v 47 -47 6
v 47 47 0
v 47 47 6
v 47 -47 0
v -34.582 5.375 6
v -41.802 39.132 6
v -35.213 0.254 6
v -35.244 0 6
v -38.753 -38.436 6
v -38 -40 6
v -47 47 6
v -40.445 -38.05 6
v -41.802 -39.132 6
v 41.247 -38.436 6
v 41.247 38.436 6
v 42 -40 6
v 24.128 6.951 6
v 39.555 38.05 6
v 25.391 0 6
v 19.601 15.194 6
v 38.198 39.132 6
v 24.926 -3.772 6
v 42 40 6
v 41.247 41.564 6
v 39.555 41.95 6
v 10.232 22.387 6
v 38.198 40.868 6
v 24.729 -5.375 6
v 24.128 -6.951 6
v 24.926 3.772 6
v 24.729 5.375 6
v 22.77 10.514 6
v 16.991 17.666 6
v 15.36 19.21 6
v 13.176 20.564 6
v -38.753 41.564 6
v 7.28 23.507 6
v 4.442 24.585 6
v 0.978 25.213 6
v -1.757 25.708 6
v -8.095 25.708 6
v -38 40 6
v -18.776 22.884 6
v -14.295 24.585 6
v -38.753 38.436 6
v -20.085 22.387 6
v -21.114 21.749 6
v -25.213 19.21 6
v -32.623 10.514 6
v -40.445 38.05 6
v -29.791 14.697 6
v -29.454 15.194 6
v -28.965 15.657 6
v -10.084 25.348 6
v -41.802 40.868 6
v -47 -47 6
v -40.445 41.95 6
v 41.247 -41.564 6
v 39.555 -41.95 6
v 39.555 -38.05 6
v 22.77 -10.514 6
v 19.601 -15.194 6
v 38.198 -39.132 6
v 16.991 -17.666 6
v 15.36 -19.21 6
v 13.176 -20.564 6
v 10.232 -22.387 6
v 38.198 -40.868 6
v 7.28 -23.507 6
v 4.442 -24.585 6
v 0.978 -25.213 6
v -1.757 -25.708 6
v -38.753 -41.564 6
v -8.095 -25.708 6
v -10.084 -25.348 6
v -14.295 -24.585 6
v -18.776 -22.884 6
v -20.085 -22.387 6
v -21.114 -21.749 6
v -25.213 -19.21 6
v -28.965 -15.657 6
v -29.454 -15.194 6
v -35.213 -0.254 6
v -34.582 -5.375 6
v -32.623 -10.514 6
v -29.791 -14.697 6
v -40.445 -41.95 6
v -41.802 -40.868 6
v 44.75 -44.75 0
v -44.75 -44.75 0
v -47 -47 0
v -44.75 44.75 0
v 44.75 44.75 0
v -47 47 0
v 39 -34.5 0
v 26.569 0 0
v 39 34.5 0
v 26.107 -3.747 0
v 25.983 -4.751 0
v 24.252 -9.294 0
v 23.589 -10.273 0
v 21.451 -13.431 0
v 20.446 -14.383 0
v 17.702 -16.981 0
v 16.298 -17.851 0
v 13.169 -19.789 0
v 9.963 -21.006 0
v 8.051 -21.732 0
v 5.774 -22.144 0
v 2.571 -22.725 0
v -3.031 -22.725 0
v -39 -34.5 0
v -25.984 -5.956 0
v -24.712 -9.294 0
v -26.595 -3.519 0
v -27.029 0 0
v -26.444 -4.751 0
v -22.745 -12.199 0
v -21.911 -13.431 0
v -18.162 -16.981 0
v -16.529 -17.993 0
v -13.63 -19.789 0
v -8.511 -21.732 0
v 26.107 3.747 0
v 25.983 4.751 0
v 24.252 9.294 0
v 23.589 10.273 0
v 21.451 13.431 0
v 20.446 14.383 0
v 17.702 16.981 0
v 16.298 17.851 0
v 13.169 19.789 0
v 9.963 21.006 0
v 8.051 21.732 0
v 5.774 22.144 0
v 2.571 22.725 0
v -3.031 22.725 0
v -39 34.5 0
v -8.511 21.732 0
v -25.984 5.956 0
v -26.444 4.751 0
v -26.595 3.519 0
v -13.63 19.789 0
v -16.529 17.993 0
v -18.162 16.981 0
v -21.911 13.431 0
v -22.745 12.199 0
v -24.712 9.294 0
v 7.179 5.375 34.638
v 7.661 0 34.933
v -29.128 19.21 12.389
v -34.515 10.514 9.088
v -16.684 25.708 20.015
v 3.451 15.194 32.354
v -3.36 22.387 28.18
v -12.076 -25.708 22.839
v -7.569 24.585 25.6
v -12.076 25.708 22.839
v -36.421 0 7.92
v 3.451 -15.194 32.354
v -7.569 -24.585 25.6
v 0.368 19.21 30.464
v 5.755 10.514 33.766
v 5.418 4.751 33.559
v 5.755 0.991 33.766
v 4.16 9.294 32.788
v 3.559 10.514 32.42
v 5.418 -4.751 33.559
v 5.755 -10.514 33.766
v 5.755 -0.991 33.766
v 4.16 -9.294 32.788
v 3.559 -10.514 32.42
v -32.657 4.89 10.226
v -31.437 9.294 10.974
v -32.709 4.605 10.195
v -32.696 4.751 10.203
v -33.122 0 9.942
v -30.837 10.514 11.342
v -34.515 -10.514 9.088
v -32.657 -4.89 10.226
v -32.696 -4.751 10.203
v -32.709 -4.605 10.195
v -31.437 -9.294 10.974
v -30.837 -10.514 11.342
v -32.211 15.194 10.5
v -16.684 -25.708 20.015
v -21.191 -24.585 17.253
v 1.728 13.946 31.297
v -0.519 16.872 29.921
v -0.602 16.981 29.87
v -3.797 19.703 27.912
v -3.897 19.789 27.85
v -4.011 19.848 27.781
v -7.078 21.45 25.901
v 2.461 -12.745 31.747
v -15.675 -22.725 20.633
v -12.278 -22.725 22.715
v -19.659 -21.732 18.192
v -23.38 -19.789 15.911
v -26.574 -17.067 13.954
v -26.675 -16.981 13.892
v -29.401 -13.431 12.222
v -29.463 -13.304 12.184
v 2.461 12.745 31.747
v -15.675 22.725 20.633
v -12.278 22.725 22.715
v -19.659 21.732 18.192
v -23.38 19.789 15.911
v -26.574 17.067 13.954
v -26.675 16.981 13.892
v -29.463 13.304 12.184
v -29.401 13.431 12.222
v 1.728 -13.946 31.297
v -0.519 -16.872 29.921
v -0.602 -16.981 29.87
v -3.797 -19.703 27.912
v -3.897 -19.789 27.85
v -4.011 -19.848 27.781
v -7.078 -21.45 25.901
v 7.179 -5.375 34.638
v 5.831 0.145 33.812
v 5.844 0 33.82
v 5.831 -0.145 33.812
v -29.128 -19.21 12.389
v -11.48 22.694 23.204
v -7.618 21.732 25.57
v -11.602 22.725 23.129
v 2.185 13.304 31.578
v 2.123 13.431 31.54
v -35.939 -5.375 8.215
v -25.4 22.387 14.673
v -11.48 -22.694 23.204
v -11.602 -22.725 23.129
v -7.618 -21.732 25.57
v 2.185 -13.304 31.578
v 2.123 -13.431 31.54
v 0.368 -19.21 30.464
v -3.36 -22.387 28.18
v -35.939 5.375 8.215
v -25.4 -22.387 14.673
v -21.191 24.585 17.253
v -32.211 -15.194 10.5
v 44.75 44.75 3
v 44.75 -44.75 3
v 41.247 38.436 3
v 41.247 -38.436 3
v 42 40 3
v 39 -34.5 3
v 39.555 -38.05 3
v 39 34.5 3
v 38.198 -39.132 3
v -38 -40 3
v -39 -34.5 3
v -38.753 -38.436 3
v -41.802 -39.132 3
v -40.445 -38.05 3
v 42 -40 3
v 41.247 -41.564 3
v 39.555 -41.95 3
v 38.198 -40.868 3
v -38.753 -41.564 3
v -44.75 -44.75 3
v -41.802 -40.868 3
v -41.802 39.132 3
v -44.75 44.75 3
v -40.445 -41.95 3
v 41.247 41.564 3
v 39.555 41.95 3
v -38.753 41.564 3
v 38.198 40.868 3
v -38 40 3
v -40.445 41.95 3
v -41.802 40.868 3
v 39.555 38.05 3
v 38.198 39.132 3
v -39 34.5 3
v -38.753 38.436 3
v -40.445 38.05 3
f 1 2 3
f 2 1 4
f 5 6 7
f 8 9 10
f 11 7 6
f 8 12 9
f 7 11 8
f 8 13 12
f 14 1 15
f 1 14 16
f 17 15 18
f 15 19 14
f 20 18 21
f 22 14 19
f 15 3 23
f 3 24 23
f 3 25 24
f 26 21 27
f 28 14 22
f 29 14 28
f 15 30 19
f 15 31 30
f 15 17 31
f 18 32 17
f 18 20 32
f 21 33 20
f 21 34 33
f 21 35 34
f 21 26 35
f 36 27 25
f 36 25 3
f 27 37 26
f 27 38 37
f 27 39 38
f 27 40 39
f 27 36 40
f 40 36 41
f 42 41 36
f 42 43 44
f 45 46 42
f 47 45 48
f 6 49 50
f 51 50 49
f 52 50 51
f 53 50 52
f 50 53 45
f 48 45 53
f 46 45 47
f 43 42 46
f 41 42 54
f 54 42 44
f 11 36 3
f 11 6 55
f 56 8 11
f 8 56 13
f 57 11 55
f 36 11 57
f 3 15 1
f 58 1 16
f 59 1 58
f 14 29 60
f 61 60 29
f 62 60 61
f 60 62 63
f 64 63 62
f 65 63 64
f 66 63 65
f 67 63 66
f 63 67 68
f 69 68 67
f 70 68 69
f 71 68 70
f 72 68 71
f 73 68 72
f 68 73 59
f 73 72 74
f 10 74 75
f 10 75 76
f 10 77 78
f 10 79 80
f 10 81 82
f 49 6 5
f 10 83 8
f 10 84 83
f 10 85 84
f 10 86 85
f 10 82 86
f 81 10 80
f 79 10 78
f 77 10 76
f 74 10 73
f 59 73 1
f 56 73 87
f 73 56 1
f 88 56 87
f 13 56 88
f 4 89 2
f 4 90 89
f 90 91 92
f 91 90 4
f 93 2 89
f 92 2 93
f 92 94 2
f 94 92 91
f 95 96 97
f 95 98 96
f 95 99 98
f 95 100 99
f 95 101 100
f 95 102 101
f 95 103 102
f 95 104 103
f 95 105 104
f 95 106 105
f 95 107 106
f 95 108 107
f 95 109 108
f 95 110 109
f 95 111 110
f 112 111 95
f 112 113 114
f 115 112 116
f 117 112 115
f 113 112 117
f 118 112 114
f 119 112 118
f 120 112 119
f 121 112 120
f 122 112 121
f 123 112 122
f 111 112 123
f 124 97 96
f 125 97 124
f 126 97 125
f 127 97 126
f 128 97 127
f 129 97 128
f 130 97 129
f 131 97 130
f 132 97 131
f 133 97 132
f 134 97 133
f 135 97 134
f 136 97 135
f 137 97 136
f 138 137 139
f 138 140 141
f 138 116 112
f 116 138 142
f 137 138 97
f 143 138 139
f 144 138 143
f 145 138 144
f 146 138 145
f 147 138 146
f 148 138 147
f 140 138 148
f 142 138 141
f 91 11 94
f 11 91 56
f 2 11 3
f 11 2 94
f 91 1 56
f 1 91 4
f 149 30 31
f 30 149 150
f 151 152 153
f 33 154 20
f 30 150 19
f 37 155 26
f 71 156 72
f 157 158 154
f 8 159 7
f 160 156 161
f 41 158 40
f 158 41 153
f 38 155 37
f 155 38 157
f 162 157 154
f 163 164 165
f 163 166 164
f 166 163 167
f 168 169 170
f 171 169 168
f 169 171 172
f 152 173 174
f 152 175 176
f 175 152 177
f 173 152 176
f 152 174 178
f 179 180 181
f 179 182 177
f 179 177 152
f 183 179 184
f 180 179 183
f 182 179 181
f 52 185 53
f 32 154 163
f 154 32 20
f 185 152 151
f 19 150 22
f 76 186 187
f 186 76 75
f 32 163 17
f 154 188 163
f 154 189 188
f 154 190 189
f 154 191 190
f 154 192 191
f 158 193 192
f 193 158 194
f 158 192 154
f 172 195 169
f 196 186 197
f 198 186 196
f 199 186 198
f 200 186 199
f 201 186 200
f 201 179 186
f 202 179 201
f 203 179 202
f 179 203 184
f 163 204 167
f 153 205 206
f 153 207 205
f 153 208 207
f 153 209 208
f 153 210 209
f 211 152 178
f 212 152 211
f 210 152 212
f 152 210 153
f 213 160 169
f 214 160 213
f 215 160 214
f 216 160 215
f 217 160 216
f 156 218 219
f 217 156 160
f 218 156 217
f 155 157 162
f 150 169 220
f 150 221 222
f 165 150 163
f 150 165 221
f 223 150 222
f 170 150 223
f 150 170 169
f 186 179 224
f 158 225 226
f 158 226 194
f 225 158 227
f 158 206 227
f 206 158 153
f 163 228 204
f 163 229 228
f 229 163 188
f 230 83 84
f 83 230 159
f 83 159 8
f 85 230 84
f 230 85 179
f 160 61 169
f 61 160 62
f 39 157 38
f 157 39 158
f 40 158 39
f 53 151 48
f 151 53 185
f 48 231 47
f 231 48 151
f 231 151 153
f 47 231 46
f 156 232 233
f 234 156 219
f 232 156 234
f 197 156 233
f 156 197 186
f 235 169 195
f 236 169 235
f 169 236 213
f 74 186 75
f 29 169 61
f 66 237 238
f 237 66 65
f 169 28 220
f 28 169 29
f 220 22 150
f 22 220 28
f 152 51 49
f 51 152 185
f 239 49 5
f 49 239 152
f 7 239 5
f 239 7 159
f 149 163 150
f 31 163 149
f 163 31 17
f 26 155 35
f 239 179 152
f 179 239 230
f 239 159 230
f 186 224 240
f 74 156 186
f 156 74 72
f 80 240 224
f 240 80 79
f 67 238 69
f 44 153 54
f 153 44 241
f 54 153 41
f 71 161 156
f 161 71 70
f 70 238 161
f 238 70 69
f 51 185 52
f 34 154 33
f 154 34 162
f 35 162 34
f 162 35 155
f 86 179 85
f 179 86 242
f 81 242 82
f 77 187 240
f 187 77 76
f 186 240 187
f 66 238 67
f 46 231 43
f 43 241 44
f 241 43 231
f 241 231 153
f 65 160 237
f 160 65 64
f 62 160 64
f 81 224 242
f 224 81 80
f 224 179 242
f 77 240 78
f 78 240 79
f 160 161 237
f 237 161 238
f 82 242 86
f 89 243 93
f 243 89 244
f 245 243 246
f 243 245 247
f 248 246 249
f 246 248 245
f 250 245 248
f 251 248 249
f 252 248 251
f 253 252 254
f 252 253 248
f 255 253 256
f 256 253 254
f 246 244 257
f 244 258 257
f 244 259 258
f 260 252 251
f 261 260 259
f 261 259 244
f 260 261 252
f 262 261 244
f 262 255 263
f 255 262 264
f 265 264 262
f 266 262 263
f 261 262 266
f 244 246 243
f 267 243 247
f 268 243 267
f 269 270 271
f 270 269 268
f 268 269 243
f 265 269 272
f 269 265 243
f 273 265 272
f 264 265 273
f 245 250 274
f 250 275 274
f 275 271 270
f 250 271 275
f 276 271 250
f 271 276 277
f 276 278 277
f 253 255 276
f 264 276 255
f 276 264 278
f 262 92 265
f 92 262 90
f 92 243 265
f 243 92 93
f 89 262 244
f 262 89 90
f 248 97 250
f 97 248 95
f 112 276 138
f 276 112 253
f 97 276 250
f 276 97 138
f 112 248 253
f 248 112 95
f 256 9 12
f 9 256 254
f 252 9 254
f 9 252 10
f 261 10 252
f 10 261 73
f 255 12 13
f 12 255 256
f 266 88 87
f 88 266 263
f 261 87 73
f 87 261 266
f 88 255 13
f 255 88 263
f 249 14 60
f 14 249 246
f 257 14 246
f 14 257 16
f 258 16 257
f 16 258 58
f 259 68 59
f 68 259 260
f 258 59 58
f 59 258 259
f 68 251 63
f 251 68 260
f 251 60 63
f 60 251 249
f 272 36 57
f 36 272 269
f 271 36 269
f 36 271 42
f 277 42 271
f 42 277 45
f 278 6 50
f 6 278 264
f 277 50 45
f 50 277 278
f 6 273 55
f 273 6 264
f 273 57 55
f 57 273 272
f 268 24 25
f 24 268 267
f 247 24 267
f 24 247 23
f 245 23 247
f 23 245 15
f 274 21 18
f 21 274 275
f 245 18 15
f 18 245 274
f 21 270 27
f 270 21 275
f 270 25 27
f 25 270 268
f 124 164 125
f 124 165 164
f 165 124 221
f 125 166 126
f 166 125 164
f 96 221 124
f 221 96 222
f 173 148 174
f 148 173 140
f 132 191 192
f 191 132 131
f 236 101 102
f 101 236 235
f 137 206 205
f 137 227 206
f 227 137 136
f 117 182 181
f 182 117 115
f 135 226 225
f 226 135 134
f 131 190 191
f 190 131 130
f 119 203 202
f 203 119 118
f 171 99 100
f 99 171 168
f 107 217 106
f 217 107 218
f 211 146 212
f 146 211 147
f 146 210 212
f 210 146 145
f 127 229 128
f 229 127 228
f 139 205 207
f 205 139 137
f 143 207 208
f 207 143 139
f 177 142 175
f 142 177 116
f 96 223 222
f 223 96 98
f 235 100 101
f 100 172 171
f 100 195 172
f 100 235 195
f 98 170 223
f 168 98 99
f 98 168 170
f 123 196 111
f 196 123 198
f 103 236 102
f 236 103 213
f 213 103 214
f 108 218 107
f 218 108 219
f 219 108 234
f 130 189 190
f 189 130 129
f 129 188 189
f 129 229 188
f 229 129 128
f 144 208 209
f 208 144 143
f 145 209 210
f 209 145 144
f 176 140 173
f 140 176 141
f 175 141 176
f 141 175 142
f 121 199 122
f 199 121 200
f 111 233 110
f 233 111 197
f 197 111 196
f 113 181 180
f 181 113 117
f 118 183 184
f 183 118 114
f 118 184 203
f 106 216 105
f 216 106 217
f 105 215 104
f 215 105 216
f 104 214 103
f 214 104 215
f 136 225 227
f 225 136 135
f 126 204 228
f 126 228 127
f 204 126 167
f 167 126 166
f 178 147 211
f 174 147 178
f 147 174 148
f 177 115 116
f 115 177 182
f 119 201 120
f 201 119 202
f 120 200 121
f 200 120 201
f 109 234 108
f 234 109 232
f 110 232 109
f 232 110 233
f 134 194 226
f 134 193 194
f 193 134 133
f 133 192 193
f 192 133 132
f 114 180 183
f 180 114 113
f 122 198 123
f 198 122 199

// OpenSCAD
// file: ../../library.scad
module tubo(
	h/*Altura*/,
	w/*Pared*/,
	d/*Diametro*/
){
  difference()
  {
    cylinder(r=(d/2), h);
    translate([0,0,-0.1])
    cylinder(r=(d/2)-(2*w), h+0.2);
  }
}

module huyoMasPared(
	d/*Diametro del hoyo*/,
	w/*Pared*/,
	h/*Altura*/,
){
  difference()
  {
    cylinder(r=((d+(2*w))/2), h);
    translate([0,0,-0.1])
    cylinder(r=(d/2), h+0.2);
  }
}

module cuboMasPared(
    w1, //Largo
    w2, //Ancho
    p1, //Pared
    p2, //Pared
    h   //Alto
)
{    
    difference()
    {
        translate([-(w1+(p1*2))/2,-(w2+(p2*2))/2,0])
        cube([(w1+(p1*2)),(w2+(p2*2)),h]);
        
        translate([-w1/2,-w2/2,-0.2])
        cube([w1,w2,h*2]);
        
    }
    
    
}

soporteW = 0.7;

module soporteCylinder()
{
  difference()
  {
	cylinder(r=radio,altura);

	translate([0,0,-0.1])
	cylinder(r=radio-soporteW,altura+0.2);
  }

  if(true){
  difference()
  {
	cylinder(r=radio+0.75,1);

	translate([0,0,-0.1])
	cylinder(r=radio-0.75,1.25);
  }}

}

module soporteOval()
{
  difference()
  {
	oval(w=ancho, h=largo, height=alto, center = false);

	translate([0,0,-0.1])
	oval(ancho-soporteW, largo, alto+0.2);
  }

  difference()
  {
	oval(w=ancho+1, h=largo+1, height=1, center = false);

	translate([0,0,-0.1])
	oval(w=ancho-1, h=largo-1, height=1.25, center = false);
  }

}


module oval(w,h, height, center = false)
{
  scale([1, h/w, 1]) cylinder(h=height, r=w, center=center);
}
// file: Frame.scad
include <Diffracter.scad>

frameW = 64;
frameH = 53.5;
frameD = 2.5;

slideW = frameW - 9;
slideH = frameH - 10;
slideD = 0.8;

winW = slideW;
winH = slideH - 10;

diffW = winW+5;
diffH = winH+13;


//Activate this to display
if(false)
{
  Frame();
}

module Frame()
{
difference()
{

  //translate([-frameW/2,-frameH/2,0])
  //cube([frameW,frameH,frameD]);

  areaSello();

  translate([-winW/2,-winH/2,-0.5])
  cube([winW,winH,frameD*2]);

  translate([-diffW/2,-diffH/2,frameD-0.8])
  cube([diffW,diffH,2]);

}
}


module areaSello()
{
  //cylinder(r=(raspSellR/2)-1,frameD);

  translate([-(frameW)/2,-(frameH)/2,0])
  cube([frameW,frameH,frameD]);
}
// file: Diffracter.scad
//include <Tapa.scad>
include <../../library.scad>


bigW = 88;
ori = bigW/2;
raspSellR = 59;
tuboH = 140;
H = 18.5;
selloH = 7;
tornR = 2;

huecoPared = 12;
huecoH = 22;
selloHembraRadio=40;

//Activate this to display
if(0)
{
translate([0,0,bigW/2])
rotate([0,90,0])
diffracter();


//soporteCylinder(radio=25.2,altura=3.8);

}


module diffracter(){	

difference(){

//Bloque
translate([-bigW/2,-bigW/2,0])
cube([bigW,bigW,H]);


translate([
						-(bigW-huecoPared)/2,
						-(bigW-huecoPared)/2,
						(huecoH/2)
					])
		cube([
					bigW-huecoPared,
					bigW-huecoPared,
					H-huecoH]
				);


//Diffractador
translate([-37.25,-40,-0.1])
cube([74.5,80,5.6]);

//Macro
translate([0,0,5.4])
cylinder(r=(74.5/2),8.2);

//Sello de raspberry
//translate([0,0,-0.1])
//cylinder(r=(raspSellR/2)+1,2);

//Tubo
//translate([0,0,-0.1])
//cylinder(r=(52/2),200);

//Tornillos abajo
translate([-ori+4,-ori+4,-0.1])
cylinder(r=tornR,20);
translate([ori-4,-ori+4,-0.1])
cylinder(r=tornR,20);
translate([-ori+4,ori-4,-0.1])
cylinder(r=tornR,20);
translate([ori-4,ori-4,-0.1])
cylinder(r=tornR,20);

//Hueco
cylinder(r=35.5,H+1);

//Tornillos caja
translate([0,0,(tuboH/2)-7])
rotate([0,90,0])
tornillosArriba();

//Tornillo tripie
translate([-ori-0.1,0,(tuboH/2)+7])
rotate([0,90,0])
cylinder(r=5/2,5.31);

//Sello hembra
translate([0,0,H-3])
cylinder(r=selloHembraRadio,4);

}

//Sello cobertura
//translate([0,0,H-1])
//huyoMasPared(58,3,3);


}
// main file
include <Diffracter.scad>
include <Frame.scad>
include <../../library.scad>

// 3.15° for every 100 l/mm

angulo = 31.5;

coberW = bigW+6;
coberH = 6;
coberOffset = 2.3;//Posición del tubo
coberOffset2 = -7;//Altura del tubo
cobeSellH = 4;
cobeSellW1 = 7;
cobeSellW2 = 7;

torrRadio = 2;





//soporteCylinder(radio=29,altura=coberH);	
//soporteOval(ancho=28, largo=25, alto=coberH);
//soporteCylinder(radio=34,altura=coberH);
//frameSello();


difference()
{
areaExterna();

//Tubo Interno
translate([15-coberOffset,0,-14.1+coberOffset2])
rotate([0,-angulo,0])//3.15 cada 100 (antes 40)
cylinder(r=(45.7)/2,52);

//Cuadro de la pared
creaContorno();
translate([-bigW/2,-bigW/2,-40+coberH-6])
cube([bigW,bigW,40]);

//Tornillos
tornPass();

//Contorno
creaContorno();

}

//creaSelloMacho();






module creaContorno()
{

 difference()
 {
   translate([-(coberW-4.5)/2,-(coberW-4.5)/2,-3])
   cube([(coberW-4.5),(coberW-4.5),coberH]);

   translate([-(coberW-16)/2,-(coberW-25)/2,-3])
   cube([(coberW-16),(coberW-25),coberH]);
 }

/*
 translate([-(coberW-6)/2,-(coberW-6)/2,-3])
 cube([(coberW-6),8.8,coberH]);

 translate([-(coberW-5)/2,((coberW-5)/2)-8.5,-3])
 cube([(coberW-5),10,coberH]);

 translate([(-(coberW-5)/2),-((coberW-6)/2),-3])
 cube([5.5,(coberW-6),coberH]);

 translate([((coberW-5.5)/2)-5,-((coberW-6)/2),-3])
 cube([5.5,(coberW-6),coberH]);
*/
}



module creaSelloMacho()
{

 translate([0,0,coberH-cobeSellH])
 difference()
 {
  areaSello(frameD=cobeSellH);

  translate([-(frameW-cobeSellW1)/2,-(frameH-cobeSellW2)/2,-0.1])
  cube([frameW-cobeSellW1,frameH-cobeSellW2,cobeSellH+1]);
 }
}

module areaExterna()
{
//Cobertura
translate([-coberW/2,-coberW/2,0])
cube([coberW,coberW,coberH]);

//TuboExterno
translate([13-coberOffset,0,-12.5+coberOffset2])
rotate([0,-angulo,0])/*3.15 cada 100 (antes 40)*/
cylinder(r=(45.7+6)/2,48);
}

module recorteOval()
{
  translate([-0.4,0,-1.9])
  oval(26.8,22.9, 15, center = false);
}

module tornPass()
{
translate([-ori+4,-ori+4,-0.1])
cylinder(r=torrRadio,30);
translate([ori-4,-ori+4,-0.1])
cylinder(r=torrRadio,30);
translate([-ori+4,ori-4,-0.1])
cylinder(r=torrRadio,30);
translate([ori-4,ori-4,-0.1])
cylinder(r=torrRadio,30);
}
